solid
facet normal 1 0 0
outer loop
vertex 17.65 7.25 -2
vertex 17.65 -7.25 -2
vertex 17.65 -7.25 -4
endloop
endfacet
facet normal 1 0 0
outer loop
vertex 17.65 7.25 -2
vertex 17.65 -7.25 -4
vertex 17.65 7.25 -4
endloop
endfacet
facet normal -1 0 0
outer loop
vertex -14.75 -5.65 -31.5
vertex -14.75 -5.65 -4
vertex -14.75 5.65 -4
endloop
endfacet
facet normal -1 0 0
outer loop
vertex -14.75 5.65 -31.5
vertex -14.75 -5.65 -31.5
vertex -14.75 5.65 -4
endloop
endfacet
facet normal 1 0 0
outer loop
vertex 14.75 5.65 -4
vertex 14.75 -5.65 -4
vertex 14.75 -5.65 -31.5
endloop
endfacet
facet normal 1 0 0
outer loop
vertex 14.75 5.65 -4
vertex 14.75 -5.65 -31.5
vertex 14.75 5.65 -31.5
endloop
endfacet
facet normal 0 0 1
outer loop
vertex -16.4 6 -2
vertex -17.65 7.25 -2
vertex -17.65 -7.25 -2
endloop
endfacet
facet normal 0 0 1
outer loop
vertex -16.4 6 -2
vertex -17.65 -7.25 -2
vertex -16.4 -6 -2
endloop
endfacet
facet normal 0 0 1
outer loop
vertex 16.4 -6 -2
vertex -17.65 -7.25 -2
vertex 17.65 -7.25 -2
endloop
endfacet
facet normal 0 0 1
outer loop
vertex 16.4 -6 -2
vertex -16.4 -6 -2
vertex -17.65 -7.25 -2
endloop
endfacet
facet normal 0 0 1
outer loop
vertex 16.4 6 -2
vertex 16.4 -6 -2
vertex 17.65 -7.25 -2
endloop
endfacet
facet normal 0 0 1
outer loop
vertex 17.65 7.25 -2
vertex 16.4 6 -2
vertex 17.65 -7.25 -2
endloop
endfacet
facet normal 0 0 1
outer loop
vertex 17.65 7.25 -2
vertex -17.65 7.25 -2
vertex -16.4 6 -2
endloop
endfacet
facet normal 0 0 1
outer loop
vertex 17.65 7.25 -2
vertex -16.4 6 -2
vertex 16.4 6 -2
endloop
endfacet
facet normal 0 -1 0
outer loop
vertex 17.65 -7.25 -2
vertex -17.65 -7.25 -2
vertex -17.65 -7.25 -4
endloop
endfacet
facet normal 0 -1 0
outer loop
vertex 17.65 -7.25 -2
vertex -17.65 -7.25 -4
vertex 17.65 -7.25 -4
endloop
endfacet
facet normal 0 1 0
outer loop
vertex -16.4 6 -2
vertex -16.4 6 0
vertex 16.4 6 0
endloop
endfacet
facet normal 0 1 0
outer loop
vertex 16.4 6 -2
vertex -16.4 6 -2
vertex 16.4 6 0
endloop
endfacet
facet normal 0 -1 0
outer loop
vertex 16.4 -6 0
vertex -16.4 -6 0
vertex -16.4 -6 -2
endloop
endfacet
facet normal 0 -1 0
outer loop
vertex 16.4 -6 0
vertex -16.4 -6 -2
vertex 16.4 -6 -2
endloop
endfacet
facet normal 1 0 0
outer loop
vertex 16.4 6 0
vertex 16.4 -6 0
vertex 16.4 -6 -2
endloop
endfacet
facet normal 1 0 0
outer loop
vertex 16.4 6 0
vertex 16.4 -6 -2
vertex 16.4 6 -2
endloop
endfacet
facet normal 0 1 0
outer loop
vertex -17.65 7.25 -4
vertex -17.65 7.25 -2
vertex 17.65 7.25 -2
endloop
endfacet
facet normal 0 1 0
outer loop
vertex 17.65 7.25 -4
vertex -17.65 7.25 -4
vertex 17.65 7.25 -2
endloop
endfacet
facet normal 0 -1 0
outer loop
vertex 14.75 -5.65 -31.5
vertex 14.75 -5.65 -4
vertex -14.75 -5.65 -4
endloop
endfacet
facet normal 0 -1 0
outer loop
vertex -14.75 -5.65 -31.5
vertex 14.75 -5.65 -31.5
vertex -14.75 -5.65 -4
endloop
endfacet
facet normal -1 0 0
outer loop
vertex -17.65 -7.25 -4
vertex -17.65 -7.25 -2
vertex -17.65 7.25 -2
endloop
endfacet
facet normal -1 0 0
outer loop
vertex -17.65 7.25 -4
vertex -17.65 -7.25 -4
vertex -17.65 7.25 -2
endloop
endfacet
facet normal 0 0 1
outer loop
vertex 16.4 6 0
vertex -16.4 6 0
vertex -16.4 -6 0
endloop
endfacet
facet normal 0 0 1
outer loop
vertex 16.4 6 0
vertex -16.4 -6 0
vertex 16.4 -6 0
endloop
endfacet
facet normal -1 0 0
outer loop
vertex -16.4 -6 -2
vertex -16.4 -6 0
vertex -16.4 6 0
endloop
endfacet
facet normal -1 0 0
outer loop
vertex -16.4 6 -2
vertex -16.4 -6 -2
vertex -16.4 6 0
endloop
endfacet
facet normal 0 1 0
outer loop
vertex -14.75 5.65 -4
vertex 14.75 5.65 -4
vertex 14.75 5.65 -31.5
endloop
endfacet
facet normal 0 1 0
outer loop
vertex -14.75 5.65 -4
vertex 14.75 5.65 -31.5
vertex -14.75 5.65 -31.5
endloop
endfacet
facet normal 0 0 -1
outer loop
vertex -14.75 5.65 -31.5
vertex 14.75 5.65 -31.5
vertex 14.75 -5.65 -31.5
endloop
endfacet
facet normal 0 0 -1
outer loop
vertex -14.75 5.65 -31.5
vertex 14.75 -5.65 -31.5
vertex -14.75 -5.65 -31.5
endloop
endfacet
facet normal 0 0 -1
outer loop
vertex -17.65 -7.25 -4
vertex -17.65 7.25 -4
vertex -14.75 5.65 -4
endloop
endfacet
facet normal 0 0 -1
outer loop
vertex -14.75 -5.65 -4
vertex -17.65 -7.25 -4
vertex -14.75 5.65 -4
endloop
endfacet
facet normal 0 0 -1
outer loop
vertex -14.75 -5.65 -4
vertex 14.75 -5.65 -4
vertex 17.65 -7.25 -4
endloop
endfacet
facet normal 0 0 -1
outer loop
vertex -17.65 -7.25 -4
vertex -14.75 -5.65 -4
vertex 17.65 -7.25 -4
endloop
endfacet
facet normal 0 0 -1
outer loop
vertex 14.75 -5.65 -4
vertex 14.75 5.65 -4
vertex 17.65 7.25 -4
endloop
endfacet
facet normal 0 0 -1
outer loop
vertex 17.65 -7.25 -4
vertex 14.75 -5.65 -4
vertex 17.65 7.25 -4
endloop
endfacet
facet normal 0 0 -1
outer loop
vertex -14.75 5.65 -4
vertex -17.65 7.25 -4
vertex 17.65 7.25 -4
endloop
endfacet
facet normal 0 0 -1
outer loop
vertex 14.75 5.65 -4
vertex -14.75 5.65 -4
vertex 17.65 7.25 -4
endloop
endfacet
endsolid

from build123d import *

# Parameters (mm, degrees)
SKETCH_1_W          = 35.3
SKETCH_1_H          = 14.5
EXTRUDE_1_DEPTH     = 4
SKETCH_2_W          = 35.3
SKETCH_2_H          = 14.5
SKETCH_2_W_2        = 32.8
SKETCH_2_H_2        = 12
CUT_EXTRUDE_1_DEPTH = 2
SKETCH_3_W          = 29.5
SKETCH_3_H          = 11.3
EXTRUDE_2_DEPTH     = 27.5


with BuildPart() as part:
    # Эскиз1 → Бобышка-Вытянуть1 (new body)
    with BuildSketch(Plane.XY):
        Rectangle(SKETCH_1_W, SKETCH_1_H)
    extrude(amount=-EXTRUDE_1_DEPTH)

    # Эскиз2 → Вырез-Вытянуть-Тонкостенный1 (cut)
    with BuildSketch(Plane.XY):
        Rectangle(SKETCH_2_W, SKETCH_2_H)
        Rectangle(SKETCH_2_W_2, SKETCH_2_H_2, mode=Mode.SUBTRACT)
    extrude(amount=-CUT_EXTRUDE_1_DEPTH, mode=Mode.SUBTRACT)

    # Эскиз3 → Бобышка-Вытянуть2 (add)
    with BuildSketch(Plane(origin=(0, 0, -4), x_dir=(-1, 0, 0), z_dir=(0, 0, -1))):
        Rectangle(SKETCH_3_W, SKETCH_3_H)
    extrude(amount=EXTRUDE_2_DEPTH)


solid = part.part
